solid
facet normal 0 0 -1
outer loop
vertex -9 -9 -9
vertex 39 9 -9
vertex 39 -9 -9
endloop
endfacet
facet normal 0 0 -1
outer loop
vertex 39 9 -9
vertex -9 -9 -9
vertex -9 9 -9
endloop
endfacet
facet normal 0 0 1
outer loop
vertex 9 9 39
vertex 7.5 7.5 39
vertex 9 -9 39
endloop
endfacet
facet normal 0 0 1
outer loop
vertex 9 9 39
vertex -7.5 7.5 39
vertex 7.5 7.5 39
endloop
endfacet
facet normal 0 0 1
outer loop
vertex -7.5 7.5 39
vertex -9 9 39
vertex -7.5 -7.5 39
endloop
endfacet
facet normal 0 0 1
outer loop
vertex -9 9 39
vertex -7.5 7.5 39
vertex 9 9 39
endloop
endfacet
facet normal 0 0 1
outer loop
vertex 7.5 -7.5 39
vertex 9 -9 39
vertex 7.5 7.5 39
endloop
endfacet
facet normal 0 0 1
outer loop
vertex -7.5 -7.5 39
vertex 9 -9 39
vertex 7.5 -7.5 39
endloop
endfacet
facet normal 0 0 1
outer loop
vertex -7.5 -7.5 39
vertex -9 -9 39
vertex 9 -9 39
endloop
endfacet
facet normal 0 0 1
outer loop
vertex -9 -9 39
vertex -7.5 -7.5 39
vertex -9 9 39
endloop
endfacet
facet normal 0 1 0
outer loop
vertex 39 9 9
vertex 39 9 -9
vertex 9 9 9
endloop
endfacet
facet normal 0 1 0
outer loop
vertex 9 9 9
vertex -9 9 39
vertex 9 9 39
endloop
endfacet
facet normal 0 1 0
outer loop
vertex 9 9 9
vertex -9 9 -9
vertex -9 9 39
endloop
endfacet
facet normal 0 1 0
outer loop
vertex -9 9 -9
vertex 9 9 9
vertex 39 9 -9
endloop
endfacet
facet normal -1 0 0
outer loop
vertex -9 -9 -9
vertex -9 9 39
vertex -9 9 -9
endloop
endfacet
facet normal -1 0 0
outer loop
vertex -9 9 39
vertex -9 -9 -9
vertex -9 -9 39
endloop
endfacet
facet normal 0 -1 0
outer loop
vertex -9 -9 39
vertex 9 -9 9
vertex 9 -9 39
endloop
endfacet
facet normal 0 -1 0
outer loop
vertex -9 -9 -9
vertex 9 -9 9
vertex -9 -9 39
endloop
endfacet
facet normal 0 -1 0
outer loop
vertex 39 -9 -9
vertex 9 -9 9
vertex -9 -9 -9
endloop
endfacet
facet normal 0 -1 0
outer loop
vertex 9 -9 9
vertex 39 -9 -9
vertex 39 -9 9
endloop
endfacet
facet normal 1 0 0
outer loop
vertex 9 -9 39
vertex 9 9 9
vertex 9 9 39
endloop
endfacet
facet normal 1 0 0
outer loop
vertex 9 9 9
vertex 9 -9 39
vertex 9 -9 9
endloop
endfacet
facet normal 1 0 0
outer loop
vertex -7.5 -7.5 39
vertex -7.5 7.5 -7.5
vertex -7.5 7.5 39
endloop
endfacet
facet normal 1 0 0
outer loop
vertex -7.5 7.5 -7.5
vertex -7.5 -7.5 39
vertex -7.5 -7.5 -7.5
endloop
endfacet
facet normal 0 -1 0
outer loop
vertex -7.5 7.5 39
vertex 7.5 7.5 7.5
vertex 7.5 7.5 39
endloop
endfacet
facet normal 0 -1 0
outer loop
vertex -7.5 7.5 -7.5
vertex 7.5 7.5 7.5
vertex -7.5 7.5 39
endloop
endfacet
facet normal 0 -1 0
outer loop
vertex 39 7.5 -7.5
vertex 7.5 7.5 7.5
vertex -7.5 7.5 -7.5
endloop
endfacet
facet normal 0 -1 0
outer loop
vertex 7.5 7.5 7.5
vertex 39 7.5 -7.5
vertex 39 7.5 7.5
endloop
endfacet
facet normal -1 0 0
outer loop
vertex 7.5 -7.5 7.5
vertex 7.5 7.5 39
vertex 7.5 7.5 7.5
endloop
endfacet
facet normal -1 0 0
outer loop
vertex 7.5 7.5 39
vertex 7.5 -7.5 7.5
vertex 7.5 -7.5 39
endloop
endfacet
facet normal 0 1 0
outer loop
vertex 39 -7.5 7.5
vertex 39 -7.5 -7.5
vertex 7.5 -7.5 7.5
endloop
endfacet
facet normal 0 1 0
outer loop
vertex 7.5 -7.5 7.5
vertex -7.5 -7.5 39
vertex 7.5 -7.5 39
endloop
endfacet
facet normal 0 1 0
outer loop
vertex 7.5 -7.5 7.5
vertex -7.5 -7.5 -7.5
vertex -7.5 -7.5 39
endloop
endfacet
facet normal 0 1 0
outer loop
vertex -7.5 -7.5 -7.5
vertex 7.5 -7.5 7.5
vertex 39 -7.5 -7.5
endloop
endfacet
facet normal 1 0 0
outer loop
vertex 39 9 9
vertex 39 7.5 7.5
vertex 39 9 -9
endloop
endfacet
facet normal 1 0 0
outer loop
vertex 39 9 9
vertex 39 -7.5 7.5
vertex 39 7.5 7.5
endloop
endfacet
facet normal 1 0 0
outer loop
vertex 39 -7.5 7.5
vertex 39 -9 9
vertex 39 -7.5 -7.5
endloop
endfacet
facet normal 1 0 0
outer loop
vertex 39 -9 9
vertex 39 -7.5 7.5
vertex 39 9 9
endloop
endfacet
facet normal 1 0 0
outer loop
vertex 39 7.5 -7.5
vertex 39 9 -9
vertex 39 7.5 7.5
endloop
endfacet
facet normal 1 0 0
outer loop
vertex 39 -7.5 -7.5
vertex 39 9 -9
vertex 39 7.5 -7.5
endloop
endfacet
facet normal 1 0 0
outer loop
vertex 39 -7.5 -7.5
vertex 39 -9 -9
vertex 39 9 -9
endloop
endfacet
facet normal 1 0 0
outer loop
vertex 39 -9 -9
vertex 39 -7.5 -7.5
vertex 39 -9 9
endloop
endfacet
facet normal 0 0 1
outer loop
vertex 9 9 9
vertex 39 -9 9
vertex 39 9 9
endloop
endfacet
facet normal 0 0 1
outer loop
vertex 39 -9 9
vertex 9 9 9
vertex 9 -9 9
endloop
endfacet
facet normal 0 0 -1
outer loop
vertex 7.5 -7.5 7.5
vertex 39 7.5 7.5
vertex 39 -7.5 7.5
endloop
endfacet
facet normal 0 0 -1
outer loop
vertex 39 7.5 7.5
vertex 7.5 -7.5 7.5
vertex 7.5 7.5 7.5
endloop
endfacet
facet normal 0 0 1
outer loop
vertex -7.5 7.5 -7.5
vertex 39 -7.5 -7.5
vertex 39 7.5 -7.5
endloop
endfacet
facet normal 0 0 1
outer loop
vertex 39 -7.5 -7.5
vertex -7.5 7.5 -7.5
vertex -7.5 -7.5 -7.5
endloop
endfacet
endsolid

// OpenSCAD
/* [Beam Parameters] */

/* [Bracket Parameters] */

/* [Other Parameters] */








inner_square = 15;
outer_sqaure = 18;
length = 48;
angle = 90;

difference()
{
    union()
    {
        translate([0, 0, outer_sqaure/-2]) {
            linear_extrude(length)
            {
                difference()
                {
                    square(outer_sqaure,true);
                    square(inner_square,true);
                }
            }
        }
        translate([outer_sqaure/-2,0,0])
        {
            rotate([0,angle,0])
            {
                linear_extrude(length)
                {
                    difference()
                    {
                        square(outer_sqaure,true);
                        square(inner_square,true);
                    }
                }
            }
        }
    }

    translate([inner_square/-2,inner_square/-2,inner_square/2])
    {
        rotate([0,0,0])
        {
            union()
            {
                cube([inner_square,inner_square,length],false);
                rotate([0,angle,0])
                {
                    cube([inner_square,inner_square,length],false);
                }
            }
        }
    }
}
